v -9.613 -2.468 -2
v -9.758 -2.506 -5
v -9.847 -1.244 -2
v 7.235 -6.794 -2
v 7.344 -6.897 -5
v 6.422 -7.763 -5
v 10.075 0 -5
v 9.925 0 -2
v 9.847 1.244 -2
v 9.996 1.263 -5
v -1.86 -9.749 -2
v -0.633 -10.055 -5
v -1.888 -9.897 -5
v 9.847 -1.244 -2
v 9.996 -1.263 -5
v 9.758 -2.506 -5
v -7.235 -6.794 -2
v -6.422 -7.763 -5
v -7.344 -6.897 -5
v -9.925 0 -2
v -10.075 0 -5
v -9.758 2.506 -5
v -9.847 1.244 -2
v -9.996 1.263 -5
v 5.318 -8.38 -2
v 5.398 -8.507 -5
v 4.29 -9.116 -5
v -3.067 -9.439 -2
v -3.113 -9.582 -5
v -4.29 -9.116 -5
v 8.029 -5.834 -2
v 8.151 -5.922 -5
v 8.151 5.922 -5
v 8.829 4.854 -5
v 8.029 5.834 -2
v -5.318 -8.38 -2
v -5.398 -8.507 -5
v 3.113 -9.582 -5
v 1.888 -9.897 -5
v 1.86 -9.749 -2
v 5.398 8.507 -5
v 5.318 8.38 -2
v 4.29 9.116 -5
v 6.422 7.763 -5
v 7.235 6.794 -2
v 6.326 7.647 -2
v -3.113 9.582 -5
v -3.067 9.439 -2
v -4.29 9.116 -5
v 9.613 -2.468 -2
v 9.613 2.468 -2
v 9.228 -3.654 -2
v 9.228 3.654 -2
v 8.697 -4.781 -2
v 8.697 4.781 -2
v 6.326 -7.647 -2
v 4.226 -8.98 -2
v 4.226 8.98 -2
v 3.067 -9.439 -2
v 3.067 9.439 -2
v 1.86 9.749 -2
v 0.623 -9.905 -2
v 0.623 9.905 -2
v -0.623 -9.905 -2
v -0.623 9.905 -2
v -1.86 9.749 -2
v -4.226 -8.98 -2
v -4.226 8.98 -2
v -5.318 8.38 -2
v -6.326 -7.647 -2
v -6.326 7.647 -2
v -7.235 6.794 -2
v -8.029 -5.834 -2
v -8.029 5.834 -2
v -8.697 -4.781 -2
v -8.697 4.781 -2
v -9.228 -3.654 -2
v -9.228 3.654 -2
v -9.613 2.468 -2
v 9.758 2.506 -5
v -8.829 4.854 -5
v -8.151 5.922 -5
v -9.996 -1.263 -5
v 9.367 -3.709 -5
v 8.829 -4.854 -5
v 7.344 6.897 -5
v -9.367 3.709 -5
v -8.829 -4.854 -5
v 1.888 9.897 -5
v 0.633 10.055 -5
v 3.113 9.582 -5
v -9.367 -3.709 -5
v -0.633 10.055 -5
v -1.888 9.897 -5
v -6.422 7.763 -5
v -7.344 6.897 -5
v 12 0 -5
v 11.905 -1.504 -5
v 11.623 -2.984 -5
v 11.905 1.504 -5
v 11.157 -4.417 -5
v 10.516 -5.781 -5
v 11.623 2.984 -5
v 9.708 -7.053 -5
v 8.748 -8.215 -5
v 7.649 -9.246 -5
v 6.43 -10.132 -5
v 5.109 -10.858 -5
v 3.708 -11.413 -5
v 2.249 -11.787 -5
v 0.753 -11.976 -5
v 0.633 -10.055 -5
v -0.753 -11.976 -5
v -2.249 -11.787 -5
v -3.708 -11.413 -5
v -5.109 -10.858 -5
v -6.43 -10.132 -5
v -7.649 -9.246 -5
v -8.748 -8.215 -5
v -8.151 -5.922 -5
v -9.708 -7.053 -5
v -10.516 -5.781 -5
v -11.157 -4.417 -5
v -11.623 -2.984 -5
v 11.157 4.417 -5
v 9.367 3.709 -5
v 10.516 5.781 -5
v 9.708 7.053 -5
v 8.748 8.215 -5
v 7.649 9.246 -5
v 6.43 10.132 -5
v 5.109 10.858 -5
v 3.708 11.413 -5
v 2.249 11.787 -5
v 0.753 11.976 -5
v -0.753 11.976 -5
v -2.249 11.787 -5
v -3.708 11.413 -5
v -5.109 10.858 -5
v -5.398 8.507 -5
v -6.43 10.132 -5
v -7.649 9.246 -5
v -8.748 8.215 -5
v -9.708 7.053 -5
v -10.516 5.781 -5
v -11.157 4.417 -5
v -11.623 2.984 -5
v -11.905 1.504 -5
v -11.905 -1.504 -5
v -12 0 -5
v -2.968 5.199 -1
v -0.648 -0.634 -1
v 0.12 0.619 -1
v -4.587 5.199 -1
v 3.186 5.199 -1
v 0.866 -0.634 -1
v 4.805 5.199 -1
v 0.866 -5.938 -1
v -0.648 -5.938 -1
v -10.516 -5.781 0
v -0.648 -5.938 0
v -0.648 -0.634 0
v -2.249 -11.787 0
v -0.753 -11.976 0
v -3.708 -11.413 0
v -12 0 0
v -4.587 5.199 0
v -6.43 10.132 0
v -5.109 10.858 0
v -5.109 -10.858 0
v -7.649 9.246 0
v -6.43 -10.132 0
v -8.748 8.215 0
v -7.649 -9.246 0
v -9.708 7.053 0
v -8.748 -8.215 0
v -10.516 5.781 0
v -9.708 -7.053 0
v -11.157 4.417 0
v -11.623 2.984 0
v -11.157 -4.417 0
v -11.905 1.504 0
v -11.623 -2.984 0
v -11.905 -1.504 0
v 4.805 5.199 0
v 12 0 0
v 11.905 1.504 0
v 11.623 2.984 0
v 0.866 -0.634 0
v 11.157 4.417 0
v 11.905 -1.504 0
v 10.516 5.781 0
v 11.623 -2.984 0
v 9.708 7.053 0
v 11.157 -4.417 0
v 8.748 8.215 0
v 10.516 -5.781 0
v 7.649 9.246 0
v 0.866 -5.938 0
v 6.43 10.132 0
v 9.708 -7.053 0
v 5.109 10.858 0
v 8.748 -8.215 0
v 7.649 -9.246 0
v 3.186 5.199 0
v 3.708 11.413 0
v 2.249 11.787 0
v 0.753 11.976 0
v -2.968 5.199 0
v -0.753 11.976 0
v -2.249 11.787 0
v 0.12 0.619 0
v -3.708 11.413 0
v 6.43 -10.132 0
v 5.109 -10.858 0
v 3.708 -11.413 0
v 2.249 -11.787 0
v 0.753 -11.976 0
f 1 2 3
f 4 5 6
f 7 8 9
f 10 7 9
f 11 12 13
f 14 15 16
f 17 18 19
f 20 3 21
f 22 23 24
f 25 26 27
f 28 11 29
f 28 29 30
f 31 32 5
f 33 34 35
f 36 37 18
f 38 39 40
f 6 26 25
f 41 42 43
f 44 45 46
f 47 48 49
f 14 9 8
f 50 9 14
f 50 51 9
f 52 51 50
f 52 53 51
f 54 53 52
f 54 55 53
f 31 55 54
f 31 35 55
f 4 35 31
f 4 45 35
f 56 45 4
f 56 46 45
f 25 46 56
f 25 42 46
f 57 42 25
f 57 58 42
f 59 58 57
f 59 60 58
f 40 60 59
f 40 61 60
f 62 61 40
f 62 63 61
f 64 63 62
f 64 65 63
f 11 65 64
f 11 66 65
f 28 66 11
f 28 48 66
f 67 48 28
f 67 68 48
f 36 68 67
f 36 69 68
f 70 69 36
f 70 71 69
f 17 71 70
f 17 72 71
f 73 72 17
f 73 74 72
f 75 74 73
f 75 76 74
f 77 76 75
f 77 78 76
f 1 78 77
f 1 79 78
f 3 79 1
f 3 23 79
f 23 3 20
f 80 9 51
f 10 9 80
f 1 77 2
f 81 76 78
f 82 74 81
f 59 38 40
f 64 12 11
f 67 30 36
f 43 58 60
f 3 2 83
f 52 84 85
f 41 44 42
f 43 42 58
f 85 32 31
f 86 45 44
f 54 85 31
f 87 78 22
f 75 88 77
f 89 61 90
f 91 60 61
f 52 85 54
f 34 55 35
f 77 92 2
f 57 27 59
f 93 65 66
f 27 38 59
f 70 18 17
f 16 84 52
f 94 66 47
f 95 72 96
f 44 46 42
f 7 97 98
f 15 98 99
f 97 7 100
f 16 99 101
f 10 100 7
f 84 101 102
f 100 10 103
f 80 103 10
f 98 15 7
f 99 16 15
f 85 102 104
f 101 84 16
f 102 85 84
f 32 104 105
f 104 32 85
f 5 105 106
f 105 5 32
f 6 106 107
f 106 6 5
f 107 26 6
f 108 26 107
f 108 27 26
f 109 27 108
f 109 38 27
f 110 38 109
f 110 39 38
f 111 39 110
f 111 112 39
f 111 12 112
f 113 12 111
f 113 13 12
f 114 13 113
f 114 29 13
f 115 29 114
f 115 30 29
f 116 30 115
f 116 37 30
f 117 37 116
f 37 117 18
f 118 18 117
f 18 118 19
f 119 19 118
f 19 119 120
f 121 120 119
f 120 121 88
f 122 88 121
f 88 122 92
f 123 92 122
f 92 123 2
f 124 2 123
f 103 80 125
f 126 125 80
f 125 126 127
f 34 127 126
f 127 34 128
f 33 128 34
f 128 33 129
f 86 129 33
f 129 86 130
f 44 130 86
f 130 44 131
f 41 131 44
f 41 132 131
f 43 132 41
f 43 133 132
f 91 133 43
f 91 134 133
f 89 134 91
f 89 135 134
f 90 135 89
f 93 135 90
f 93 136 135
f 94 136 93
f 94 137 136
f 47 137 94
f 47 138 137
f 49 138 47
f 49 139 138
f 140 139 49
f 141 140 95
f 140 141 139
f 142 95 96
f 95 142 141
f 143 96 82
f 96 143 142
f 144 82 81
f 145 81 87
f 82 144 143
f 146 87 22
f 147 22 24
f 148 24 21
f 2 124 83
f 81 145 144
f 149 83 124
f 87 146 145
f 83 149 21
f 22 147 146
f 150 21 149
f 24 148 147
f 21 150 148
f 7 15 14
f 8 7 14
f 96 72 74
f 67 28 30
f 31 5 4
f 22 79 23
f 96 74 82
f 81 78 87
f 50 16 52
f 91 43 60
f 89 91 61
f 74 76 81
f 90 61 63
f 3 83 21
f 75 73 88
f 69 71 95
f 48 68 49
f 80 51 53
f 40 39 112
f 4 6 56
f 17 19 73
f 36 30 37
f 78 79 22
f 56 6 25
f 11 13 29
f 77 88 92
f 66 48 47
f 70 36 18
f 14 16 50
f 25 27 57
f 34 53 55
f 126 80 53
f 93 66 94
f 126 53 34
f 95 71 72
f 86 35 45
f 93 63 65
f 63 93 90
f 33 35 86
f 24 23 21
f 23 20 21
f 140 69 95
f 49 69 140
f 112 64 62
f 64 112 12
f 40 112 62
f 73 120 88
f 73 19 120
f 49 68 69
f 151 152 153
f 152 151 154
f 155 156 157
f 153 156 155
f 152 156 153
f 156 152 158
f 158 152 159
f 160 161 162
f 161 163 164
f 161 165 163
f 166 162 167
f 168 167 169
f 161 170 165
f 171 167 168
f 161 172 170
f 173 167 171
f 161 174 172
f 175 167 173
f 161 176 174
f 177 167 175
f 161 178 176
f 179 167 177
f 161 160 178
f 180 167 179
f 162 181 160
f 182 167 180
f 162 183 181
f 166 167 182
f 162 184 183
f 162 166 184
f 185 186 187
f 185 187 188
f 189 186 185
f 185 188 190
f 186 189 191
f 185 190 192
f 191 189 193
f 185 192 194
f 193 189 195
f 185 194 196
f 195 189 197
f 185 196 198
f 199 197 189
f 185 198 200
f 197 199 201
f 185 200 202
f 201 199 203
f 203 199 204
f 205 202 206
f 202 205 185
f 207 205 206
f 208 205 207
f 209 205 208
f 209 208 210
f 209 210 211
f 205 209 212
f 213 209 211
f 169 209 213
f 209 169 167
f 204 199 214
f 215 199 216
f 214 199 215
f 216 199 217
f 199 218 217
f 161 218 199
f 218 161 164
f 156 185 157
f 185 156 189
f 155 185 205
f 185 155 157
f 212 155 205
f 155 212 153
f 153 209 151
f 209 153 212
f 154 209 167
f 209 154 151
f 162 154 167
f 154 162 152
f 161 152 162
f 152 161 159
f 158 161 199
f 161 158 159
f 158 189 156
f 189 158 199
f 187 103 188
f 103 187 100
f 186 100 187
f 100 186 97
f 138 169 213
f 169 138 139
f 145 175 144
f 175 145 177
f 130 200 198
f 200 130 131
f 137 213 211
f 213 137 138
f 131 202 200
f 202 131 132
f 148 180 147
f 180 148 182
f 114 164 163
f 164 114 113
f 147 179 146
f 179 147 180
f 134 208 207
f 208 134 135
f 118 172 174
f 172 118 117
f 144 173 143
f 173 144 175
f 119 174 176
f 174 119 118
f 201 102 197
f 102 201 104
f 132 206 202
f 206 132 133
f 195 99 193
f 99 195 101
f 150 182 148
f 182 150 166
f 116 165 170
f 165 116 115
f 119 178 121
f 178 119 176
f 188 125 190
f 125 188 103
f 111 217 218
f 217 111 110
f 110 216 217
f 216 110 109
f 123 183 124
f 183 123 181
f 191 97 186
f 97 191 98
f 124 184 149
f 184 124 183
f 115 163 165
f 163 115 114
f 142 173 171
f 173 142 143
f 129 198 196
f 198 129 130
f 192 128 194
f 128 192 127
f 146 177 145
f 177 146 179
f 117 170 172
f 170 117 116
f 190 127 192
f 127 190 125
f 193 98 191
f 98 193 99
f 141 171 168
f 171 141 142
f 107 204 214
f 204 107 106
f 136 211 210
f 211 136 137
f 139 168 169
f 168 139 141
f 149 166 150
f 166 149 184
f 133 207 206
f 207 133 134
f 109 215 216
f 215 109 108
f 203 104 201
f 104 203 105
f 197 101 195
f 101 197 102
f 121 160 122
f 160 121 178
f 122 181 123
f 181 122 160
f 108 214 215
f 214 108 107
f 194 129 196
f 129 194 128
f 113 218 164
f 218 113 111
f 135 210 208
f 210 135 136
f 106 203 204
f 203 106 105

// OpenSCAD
$fn = 50;


difference() {
	union() {
		translate(v = [0, 0, -5.0000000000]) {
			cylinder(h = 5, r = 12.0000000000);
		}
	}
	union() {
		#translate(v = [0, 0, -5.0000000000]) {
			cylinder(h = 3, r1 = 10.0750000000, r2 = 9.9250000000);
		}
		translate(v = [0, -0.5000000000, -1]) {
			linear_extrude(height = 1) {
				text(font = "Webdings", halign = "center", size = 11, text = "Y", valign = "center");
			}
		}
	}
}
